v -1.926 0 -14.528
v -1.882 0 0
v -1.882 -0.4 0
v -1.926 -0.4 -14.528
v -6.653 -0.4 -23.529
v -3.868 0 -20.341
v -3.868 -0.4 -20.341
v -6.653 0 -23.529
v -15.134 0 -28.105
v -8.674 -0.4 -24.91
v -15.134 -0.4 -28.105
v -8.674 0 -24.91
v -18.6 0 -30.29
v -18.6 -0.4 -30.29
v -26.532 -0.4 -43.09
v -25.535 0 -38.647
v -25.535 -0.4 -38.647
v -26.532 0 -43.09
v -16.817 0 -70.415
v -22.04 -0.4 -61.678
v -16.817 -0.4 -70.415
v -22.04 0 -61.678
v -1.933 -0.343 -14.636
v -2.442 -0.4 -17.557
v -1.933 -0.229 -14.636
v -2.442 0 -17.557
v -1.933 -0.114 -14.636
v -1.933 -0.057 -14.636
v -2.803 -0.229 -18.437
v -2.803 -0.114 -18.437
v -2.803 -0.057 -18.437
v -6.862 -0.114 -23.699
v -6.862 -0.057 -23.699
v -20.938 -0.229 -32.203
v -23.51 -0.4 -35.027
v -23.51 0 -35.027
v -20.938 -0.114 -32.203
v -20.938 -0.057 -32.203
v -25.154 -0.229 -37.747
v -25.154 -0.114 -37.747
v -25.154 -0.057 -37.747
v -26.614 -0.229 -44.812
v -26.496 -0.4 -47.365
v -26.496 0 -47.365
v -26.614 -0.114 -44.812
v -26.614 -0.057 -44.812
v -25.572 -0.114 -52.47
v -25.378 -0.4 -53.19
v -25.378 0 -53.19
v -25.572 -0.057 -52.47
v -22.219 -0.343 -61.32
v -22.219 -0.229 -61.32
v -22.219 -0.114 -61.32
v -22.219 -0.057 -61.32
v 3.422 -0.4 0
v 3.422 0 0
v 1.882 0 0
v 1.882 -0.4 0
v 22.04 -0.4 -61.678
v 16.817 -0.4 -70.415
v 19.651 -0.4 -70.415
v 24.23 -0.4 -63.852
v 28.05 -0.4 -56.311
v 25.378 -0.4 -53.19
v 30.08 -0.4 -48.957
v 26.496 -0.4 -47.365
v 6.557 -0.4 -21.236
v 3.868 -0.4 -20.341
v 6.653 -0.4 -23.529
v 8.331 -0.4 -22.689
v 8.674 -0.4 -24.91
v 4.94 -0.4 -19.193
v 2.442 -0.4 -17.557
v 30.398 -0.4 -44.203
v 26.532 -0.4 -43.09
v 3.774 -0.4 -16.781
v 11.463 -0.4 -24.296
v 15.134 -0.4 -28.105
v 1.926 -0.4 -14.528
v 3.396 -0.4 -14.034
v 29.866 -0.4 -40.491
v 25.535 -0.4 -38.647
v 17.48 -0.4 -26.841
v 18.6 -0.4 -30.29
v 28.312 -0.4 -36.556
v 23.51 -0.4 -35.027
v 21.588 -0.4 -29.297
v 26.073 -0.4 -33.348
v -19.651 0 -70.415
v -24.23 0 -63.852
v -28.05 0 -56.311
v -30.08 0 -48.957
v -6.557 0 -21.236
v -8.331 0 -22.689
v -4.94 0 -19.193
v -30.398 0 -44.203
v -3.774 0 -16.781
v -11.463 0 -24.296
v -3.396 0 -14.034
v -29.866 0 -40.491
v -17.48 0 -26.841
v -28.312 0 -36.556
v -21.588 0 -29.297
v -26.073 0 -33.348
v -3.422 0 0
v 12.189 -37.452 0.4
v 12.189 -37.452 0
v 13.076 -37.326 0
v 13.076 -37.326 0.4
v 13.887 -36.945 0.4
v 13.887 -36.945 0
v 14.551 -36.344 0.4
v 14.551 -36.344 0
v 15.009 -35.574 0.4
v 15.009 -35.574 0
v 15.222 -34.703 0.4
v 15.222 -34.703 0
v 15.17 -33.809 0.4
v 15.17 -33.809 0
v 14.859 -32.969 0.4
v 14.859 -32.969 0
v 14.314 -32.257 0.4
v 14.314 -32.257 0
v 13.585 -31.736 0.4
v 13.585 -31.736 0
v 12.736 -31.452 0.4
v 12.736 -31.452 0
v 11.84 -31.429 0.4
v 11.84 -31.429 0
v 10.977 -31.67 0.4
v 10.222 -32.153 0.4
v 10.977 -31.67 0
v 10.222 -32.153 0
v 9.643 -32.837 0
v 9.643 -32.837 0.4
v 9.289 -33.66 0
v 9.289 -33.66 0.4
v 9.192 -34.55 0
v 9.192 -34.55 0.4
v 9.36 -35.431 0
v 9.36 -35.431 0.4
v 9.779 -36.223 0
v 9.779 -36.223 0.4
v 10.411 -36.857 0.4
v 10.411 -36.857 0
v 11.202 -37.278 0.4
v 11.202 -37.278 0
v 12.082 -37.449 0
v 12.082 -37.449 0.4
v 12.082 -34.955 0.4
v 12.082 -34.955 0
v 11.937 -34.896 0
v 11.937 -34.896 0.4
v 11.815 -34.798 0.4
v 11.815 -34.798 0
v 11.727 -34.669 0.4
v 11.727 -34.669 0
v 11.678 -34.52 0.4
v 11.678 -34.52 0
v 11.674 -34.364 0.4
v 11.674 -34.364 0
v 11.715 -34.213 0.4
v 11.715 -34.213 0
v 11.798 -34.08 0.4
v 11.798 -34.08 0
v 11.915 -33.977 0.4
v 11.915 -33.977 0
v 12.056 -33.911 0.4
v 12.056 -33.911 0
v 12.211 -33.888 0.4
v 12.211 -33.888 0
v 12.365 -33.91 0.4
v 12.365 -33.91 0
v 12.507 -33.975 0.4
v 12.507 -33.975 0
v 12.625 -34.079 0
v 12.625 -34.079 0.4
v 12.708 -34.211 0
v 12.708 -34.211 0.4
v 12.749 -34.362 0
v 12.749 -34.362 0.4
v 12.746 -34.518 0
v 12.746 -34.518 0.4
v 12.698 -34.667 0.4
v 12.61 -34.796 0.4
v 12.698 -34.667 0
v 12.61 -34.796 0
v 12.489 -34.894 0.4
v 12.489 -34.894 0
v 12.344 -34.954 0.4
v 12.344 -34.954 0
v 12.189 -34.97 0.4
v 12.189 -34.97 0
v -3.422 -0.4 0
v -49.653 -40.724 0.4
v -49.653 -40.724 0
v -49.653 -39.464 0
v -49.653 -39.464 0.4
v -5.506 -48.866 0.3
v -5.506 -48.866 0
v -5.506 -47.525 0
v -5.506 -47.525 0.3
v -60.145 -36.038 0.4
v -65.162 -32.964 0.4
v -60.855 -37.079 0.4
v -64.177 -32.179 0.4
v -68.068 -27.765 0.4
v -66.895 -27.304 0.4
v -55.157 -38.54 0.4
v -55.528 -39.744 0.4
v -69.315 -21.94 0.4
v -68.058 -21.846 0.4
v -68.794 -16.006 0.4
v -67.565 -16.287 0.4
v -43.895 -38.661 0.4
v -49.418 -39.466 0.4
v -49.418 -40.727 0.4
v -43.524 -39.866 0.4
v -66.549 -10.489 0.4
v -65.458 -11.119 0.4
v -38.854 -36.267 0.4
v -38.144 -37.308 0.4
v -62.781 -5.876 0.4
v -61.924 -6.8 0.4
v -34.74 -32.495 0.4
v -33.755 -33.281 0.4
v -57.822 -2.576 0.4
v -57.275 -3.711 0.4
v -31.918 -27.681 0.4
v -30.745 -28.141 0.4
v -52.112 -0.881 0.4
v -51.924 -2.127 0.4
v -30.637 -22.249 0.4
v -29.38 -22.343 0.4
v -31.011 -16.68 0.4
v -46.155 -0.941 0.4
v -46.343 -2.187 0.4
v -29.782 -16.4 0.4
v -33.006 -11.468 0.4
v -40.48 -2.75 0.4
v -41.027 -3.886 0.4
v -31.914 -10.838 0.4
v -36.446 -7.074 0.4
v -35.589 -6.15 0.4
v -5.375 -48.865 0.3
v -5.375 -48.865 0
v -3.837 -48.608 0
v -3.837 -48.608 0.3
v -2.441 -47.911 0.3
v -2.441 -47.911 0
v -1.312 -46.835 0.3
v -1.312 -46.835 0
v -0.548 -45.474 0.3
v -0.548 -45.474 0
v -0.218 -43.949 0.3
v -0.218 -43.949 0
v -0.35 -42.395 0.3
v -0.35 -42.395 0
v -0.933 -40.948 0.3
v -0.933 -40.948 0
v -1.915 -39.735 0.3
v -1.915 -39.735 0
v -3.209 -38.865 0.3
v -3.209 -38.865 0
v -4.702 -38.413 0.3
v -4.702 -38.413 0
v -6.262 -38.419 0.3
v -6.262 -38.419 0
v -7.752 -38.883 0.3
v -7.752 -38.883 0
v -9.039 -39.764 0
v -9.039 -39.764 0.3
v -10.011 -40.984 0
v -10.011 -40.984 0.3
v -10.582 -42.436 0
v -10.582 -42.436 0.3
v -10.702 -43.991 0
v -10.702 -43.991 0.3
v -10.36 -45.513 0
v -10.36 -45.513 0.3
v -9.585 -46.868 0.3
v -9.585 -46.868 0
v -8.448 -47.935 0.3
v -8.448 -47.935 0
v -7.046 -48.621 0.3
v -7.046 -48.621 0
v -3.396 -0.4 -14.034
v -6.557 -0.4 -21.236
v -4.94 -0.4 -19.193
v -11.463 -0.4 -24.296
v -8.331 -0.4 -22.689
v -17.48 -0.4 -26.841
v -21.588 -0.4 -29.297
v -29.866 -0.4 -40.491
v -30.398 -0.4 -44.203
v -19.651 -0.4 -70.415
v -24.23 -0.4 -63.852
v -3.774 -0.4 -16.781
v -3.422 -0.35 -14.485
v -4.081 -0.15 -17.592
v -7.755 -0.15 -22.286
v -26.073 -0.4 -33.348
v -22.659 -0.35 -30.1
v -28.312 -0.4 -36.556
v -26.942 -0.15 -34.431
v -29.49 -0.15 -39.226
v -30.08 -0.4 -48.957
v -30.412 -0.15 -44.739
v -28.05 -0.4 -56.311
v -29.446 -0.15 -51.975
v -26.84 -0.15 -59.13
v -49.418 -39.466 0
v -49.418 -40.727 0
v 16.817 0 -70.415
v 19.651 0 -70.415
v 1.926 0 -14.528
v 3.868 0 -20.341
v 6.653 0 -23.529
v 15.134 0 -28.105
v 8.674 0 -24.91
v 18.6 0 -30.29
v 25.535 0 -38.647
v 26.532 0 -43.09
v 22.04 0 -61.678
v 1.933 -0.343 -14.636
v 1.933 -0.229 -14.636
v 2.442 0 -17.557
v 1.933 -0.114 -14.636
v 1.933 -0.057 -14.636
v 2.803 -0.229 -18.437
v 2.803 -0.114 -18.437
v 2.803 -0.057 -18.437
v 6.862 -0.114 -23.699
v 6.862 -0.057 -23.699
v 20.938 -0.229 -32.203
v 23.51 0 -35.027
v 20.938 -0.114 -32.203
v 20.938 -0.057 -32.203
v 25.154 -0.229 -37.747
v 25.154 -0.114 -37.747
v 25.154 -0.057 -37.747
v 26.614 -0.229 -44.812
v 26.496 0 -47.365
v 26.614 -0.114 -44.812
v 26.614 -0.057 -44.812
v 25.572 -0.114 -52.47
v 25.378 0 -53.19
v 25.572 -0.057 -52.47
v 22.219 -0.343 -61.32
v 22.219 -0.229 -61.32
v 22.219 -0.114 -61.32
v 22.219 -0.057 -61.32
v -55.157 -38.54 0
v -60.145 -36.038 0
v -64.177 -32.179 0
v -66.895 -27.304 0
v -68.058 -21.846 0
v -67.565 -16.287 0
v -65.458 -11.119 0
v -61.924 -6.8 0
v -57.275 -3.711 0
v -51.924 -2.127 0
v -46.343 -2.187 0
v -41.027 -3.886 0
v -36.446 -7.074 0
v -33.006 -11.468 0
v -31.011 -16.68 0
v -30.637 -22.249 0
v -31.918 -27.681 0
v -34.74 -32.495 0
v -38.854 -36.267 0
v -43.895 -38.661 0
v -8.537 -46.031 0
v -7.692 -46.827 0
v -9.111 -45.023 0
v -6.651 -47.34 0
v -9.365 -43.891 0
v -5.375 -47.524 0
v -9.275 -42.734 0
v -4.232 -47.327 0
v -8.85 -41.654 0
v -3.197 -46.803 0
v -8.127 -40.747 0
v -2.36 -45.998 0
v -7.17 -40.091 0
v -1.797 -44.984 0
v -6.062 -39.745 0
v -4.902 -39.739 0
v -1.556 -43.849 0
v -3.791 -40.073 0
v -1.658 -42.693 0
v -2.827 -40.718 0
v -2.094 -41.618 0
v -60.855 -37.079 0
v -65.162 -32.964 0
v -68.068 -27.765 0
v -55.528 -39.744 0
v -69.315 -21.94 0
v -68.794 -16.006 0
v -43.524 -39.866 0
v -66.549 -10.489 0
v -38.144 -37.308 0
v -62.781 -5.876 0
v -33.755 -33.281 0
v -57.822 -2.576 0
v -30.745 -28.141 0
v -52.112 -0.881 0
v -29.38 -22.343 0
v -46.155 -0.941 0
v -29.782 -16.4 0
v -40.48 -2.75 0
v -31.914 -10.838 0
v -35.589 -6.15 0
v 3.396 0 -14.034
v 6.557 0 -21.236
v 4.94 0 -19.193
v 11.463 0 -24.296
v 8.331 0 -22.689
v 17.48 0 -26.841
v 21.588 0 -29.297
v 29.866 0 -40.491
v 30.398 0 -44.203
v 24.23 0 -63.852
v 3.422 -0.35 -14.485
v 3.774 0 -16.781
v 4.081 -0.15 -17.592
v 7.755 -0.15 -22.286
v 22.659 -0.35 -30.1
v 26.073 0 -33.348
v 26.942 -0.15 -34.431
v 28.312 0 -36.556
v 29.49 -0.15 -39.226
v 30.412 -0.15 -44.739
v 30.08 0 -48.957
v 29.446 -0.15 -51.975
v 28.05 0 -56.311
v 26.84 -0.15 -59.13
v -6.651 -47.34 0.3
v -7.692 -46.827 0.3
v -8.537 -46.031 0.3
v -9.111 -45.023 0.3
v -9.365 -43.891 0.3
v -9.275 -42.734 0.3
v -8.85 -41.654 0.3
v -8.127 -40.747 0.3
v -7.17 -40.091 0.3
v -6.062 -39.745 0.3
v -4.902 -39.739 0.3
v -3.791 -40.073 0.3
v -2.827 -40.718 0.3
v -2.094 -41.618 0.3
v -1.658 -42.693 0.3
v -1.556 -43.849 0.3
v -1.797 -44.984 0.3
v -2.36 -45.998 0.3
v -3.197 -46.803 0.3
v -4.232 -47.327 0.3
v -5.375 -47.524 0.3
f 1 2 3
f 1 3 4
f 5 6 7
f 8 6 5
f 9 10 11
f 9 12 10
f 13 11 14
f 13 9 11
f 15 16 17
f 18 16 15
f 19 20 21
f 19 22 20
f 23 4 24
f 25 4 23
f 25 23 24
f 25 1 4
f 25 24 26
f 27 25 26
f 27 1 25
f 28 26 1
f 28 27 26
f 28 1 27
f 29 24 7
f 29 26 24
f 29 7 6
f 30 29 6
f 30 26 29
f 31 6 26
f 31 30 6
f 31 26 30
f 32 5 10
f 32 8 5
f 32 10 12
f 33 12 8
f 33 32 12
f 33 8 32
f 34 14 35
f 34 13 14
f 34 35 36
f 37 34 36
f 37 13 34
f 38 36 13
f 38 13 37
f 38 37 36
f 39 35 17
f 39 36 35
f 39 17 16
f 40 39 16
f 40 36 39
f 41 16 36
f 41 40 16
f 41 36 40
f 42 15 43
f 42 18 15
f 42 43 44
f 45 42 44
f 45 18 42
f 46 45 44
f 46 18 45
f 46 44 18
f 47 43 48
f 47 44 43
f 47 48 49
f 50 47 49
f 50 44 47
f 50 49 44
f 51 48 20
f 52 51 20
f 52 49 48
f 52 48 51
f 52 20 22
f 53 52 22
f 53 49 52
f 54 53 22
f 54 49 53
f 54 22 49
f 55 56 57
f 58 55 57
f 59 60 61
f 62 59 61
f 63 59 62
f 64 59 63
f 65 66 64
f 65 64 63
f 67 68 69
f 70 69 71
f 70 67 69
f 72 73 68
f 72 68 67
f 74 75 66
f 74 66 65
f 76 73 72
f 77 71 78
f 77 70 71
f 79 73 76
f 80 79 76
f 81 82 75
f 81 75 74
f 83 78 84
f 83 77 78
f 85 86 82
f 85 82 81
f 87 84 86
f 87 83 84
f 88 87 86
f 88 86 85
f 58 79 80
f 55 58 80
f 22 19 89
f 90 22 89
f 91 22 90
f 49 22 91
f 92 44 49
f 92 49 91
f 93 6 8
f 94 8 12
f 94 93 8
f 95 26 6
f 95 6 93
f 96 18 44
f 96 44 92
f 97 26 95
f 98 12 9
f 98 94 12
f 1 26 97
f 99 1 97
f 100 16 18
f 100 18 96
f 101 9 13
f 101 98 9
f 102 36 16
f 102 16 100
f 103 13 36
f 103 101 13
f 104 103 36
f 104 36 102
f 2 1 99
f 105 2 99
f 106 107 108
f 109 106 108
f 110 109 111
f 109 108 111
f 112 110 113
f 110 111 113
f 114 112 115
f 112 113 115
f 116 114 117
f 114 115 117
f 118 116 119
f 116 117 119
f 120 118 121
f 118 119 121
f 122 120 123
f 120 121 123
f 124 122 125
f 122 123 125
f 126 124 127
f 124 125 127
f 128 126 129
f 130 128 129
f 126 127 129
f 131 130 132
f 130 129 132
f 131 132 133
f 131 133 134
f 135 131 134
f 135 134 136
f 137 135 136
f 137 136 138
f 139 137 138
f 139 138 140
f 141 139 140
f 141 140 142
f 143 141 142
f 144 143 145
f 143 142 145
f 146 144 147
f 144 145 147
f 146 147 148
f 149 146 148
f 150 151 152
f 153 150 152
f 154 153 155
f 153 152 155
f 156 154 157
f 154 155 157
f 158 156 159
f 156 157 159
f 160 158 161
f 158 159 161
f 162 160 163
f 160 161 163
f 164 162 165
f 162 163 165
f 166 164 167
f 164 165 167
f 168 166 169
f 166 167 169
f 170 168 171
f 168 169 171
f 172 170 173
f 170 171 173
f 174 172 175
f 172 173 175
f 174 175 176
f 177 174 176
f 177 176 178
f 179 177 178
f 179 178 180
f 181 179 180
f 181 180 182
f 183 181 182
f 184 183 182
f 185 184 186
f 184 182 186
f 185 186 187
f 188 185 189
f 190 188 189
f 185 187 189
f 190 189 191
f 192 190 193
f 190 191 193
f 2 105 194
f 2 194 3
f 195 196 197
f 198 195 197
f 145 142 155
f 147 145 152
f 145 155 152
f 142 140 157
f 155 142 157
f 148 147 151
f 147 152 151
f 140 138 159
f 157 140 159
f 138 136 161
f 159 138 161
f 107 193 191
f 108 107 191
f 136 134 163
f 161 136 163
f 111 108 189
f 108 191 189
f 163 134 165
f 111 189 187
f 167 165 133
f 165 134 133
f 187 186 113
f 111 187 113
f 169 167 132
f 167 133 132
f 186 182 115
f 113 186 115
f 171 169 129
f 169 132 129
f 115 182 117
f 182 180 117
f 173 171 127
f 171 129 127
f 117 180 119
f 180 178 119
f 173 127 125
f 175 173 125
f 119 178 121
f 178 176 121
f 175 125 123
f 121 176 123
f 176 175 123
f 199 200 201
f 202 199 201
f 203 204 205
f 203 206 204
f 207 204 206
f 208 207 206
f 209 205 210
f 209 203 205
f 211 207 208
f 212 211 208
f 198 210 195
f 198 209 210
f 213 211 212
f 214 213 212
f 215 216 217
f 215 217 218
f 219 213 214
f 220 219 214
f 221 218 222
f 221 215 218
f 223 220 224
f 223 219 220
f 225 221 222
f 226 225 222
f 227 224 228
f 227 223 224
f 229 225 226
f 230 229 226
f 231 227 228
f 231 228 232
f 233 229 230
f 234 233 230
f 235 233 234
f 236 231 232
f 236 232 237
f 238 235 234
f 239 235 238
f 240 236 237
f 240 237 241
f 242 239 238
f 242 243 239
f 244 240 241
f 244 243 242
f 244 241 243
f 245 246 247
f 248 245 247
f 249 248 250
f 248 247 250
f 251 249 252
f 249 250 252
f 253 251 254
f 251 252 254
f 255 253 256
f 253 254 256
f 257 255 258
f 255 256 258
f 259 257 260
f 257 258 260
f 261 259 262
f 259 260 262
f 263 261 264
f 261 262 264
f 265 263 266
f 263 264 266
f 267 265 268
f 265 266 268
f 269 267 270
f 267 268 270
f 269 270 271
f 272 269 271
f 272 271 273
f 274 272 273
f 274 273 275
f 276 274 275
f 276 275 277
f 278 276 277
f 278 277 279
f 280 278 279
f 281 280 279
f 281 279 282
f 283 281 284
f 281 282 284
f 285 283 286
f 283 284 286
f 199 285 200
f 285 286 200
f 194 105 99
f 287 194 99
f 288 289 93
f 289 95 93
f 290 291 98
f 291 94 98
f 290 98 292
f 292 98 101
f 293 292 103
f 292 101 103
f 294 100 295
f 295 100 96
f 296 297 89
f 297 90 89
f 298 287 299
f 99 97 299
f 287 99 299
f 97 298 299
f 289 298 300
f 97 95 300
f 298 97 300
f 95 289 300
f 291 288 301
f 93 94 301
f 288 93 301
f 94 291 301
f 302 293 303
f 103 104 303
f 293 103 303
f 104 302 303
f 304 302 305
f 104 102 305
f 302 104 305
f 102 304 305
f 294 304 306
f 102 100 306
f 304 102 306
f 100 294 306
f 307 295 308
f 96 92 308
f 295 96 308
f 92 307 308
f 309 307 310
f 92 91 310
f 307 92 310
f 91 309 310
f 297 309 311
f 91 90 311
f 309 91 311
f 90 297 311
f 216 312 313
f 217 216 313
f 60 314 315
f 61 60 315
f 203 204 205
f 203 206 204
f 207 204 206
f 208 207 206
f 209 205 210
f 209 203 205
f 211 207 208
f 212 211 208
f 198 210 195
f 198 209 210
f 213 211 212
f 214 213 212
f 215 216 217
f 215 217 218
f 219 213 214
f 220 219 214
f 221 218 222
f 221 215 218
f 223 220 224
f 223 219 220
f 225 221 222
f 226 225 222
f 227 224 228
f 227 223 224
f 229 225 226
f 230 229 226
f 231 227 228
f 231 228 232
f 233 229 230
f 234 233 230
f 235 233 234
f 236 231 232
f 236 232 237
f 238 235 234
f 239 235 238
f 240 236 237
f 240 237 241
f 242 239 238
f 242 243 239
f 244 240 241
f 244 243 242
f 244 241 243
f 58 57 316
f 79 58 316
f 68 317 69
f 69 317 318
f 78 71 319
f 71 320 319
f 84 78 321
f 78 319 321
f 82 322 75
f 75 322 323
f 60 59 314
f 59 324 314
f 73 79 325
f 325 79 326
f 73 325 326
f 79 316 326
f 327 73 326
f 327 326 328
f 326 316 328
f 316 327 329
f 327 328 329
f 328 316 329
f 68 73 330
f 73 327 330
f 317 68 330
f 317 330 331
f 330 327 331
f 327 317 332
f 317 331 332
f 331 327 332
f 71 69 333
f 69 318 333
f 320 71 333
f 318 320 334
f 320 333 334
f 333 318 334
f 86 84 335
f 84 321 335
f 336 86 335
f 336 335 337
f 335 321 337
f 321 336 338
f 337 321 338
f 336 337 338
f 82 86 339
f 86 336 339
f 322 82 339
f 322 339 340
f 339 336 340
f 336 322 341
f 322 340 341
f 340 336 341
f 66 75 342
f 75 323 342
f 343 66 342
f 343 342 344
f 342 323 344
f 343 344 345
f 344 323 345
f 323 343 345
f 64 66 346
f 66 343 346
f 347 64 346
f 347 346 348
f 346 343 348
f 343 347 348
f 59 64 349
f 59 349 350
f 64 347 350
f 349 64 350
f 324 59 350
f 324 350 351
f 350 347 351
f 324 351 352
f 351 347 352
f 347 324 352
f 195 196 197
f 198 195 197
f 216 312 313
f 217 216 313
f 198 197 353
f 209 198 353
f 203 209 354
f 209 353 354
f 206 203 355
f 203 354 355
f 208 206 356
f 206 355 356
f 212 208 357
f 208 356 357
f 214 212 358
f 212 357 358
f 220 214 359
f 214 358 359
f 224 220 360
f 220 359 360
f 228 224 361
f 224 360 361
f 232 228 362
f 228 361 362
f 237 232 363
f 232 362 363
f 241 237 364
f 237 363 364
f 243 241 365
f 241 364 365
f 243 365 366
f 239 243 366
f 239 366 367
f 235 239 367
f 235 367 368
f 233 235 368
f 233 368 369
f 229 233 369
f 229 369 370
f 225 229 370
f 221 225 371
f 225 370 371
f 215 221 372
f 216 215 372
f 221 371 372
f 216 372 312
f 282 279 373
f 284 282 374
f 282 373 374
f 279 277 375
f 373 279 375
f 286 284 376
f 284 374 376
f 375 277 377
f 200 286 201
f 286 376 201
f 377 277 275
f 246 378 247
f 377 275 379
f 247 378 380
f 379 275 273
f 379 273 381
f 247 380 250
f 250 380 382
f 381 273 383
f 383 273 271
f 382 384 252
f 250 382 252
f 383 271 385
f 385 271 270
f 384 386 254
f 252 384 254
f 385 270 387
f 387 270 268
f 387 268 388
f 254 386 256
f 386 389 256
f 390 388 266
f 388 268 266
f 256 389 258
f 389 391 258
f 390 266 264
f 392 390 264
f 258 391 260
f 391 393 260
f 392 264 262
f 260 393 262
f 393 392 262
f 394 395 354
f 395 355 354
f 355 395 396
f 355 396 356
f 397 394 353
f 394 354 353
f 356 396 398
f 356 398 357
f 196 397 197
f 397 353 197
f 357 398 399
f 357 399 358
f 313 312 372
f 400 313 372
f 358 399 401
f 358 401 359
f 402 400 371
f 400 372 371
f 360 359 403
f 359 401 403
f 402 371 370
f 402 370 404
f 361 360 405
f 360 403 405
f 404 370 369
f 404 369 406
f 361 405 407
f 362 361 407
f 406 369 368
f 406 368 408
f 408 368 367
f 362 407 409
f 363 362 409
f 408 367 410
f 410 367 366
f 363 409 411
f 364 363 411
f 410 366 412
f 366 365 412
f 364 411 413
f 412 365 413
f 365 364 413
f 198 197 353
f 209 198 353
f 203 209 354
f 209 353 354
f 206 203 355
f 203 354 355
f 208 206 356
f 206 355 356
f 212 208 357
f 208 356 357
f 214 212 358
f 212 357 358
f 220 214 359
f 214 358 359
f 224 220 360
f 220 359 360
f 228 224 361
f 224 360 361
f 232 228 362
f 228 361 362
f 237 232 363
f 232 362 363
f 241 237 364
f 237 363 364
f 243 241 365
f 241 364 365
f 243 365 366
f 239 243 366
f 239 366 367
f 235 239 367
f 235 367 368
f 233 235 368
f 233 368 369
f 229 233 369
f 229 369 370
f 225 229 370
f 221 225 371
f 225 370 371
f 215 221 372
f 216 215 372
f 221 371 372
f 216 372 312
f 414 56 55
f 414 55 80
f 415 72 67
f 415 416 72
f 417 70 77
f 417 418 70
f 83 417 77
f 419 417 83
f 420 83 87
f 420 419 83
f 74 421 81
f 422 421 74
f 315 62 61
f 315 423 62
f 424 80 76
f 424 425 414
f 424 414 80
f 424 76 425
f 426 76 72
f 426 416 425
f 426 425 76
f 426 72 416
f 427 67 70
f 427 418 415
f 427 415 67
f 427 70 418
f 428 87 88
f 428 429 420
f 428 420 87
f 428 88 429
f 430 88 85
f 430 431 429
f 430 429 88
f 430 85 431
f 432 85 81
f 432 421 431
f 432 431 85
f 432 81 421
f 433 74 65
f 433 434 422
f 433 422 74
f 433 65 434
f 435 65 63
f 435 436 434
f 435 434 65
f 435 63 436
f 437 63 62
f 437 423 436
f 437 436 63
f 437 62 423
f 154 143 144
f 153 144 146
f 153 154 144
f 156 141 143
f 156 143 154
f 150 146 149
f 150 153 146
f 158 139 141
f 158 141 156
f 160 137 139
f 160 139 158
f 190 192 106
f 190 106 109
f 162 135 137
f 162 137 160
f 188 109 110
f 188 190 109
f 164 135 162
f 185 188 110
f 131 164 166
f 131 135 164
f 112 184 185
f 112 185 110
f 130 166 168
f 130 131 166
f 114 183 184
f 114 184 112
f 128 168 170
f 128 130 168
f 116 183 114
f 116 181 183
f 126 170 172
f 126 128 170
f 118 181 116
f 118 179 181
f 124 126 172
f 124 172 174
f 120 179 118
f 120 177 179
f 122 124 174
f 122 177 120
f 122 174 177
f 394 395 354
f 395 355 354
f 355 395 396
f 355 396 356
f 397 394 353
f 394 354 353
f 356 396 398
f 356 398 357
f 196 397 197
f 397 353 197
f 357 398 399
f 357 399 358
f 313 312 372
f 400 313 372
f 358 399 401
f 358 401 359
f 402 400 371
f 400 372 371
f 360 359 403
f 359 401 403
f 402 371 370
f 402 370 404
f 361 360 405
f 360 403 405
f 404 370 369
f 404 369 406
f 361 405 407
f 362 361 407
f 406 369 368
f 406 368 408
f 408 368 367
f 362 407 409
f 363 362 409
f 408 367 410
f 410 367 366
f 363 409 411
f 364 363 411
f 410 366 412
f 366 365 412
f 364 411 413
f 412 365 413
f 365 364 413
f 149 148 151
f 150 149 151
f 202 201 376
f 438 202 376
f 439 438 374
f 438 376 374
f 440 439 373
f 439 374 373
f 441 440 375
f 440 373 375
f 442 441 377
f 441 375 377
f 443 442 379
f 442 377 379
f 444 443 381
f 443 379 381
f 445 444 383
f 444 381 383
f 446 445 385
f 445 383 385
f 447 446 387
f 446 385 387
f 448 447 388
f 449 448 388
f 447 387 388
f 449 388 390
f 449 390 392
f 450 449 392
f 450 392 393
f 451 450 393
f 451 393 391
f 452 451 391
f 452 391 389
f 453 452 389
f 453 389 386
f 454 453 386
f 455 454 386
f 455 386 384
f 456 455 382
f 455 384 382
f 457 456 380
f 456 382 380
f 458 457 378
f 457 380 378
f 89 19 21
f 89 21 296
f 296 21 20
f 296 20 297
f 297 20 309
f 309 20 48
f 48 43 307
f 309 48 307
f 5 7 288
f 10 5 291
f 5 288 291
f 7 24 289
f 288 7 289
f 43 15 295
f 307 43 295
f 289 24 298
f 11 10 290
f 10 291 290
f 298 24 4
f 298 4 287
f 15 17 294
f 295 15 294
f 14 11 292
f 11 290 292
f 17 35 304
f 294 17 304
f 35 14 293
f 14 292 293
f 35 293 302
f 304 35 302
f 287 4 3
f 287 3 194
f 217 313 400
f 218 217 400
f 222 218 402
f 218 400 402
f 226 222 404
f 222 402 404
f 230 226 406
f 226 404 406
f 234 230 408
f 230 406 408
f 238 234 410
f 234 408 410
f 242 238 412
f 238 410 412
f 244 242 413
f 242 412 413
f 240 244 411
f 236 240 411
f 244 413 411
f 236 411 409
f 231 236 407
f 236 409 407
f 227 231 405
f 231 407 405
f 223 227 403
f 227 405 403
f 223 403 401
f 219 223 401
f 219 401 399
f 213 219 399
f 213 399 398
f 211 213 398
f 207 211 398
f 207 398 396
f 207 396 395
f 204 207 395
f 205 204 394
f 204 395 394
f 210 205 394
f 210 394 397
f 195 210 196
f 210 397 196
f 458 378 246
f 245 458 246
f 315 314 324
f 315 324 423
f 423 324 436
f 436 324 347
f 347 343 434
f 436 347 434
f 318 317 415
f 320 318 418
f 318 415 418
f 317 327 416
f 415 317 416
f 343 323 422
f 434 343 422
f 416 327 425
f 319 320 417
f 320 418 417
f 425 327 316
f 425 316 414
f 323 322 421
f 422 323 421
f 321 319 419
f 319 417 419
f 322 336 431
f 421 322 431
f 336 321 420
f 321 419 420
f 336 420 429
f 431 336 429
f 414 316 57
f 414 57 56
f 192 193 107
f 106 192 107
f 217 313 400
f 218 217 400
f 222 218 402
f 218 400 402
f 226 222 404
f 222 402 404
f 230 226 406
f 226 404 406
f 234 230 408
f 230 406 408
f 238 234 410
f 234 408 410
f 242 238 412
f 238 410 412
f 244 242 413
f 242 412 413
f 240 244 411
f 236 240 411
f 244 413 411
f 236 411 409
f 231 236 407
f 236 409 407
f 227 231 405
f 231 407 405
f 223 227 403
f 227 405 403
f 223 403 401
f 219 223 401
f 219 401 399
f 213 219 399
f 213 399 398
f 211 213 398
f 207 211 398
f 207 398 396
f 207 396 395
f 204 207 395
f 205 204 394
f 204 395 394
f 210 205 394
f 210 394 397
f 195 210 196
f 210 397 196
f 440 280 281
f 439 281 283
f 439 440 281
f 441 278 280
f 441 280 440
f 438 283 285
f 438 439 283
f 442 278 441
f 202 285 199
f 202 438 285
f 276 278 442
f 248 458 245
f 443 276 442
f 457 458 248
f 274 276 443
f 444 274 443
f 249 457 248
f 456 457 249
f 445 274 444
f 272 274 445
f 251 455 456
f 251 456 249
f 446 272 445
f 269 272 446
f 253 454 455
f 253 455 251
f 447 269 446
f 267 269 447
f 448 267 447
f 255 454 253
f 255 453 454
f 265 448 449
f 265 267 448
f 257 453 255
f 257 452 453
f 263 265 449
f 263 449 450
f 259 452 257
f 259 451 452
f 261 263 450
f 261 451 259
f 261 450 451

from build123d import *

# Parameters (mm, degrees)
F1_DEPTH = 0.4
F3_DEPTH = 0.4
F6_DEPTH = 0.3
F8_DEPTH = 0.4
F9_DEPTH = 0.4


with BuildPart() as f1:
    # F0 (on Front) → F1 (new body)
    with BuildSketch(Plane.XZ):
        with BuildLine():
            Line((3.4221610986, 0), (1.8824809231, 0))
            add(Edge.make_bspline(
                [(1.8824809231, 0), (1.8903812121, -5.9257154178), (1.6594668434, -14.4064557365), (2.4787172842, -18.43211263), (6.6506599647, -24.738490893), (15.7198781859, -27.5720263129), (27.4382807219, -36.9703939443), (26.5672023611, -53.5146710168), (21.0862921581, -64.1355530397), (16.817227006, -70.414558053)],
                knots=[0, 0, 0, 0, 0.1629214389, 0.247012266, 0.3567945031, 0.4886798756, 0.6462746816, 0.8097112488, 1, 1, 1, 1], degree=3))
            Line((16.817227006, -70.414558053), (19.6510907263, -70.414558053))
            add(Edge.make_bspline(
                [(3.4221610986, 0), (3.2444735314, -5.7591898503), (3.2349564943, -14.2906745538), (3.8118276563, -17.5808403399), (7.498018045, -23.4402005142), (17.8154663316, -26.1043224844), (27.8878603719, -33.7930801493), (31.7612136388, -44.7779110201), (27.5370112916, -59.6956080616), (22.2387276369, -66.8970857954), (19.6510907263, -70.414558053)],
                knots=[0, 0, 0, 0, 0.1487055839, 0.2183301192, 0.3137287288, 0.440892628, 0.5777724202, 0.7066287166, 0.8570783912, 1, 1, 1, 1], degree=3))
        make_face()
    extrude(amount=F1_DEPTH)


with BuildPart() as f3:
    # F2 (on Top) → F3 (new body)
    with BuildSketch(Plane.XY):
        with BuildLine():
            Line((-49.4176302, -39.4664883101), (-49.4176302, -40.7268284131))
            ThreePointArc((-49.4176302, -40.7268284131), (-49.1312031177, -0.6877838741), (-49.652604706, -40.7244579174))
            Line((-49.652604706, -40.7244579174), (-49.652604706, -39.4639585349))
            ThreePointArc((-49.652604706, -39.4639585349), (-49.1312026346, -1.9481804524), (-49.4176302, -39.4664883101))
        make_face()
    extrude(amount=F3_DEPTH)


with BuildPart() as f4_1:
    # F4: instance of F1
    add(f1.part.mirror(Plane.YZ))


with BuildPart() as f6:
    # F5 (on Top) → F6 (new body)
    with BuildSketch(Plane.XY):
        with BuildLine():
            Line((-5.3753433014, -47.5238926069), (-5.3753433014, -48.8651284462))
            ThreePointArc((-5.3753433014, -48.8651284462), (-5.4824619344, -38.3575708488), (-5.5057317572, -48.8656486739))
            Line((-5.5057317572, -48.8656486739), (-5.5057317572, -47.5245911583))
            ThreePointArc((-5.5057317572, -47.5245911583), (-5.4824632303, -39.6985788926), (-5.3753433014, -47.5238926069))
        make_face()
    extrude(amount=F6_DEPTH)


with BuildPart() as f8:
    # F7 (on Top) → F8 (new body)
    with BuildSketch(Plane.XY):
        with BuildLine():
            Line((12.1885957196, -34.9699395875), (12.1885957196, -37.4516981663))
            ThreePointArc((12.1885957196, -37.4516981663), (12.2885523534, -31.4072937312), (12.0817911632, -37.4489877083))
            Line((12.0817911632, -37.4489877083), (12.0817911632, -34.9545814097))
            ThreePointArc((12.0817911632, -34.9545814097), (12.2889239602, -33.8931805541), (12.1885957196, -34.9699395875))
        make_face()
    extrude(amount=F8_DEPTH)


with BuildPart() as f9:
    # F2 (on Top) → F9 (new body)
    with BuildSketch(Plane.XY):
        with BuildLine():
            Line((-49.4176302, -39.4664883101), (-49.4176302, -40.7268284131))
            ThreePointArc((-49.4176302, -40.7268284131), (-49.1312031177, -0.6877838741), (-49.652604706, -40.7244579174))
            Line((-49.652604706, -40.7244579174), (-49.652604706, -39.4639585349))
            ThreePointArc((-49.652604706, -39.4639585349), (-49.1312026346, -1.9481804524), (-49.4176302, -39.4664883101))
        make_face()
    extrude(amount=F9_DEPTH)


solid = Compound([f1.part, f3.part, f4_1.part, f6.part, f8.part, f9.part])
